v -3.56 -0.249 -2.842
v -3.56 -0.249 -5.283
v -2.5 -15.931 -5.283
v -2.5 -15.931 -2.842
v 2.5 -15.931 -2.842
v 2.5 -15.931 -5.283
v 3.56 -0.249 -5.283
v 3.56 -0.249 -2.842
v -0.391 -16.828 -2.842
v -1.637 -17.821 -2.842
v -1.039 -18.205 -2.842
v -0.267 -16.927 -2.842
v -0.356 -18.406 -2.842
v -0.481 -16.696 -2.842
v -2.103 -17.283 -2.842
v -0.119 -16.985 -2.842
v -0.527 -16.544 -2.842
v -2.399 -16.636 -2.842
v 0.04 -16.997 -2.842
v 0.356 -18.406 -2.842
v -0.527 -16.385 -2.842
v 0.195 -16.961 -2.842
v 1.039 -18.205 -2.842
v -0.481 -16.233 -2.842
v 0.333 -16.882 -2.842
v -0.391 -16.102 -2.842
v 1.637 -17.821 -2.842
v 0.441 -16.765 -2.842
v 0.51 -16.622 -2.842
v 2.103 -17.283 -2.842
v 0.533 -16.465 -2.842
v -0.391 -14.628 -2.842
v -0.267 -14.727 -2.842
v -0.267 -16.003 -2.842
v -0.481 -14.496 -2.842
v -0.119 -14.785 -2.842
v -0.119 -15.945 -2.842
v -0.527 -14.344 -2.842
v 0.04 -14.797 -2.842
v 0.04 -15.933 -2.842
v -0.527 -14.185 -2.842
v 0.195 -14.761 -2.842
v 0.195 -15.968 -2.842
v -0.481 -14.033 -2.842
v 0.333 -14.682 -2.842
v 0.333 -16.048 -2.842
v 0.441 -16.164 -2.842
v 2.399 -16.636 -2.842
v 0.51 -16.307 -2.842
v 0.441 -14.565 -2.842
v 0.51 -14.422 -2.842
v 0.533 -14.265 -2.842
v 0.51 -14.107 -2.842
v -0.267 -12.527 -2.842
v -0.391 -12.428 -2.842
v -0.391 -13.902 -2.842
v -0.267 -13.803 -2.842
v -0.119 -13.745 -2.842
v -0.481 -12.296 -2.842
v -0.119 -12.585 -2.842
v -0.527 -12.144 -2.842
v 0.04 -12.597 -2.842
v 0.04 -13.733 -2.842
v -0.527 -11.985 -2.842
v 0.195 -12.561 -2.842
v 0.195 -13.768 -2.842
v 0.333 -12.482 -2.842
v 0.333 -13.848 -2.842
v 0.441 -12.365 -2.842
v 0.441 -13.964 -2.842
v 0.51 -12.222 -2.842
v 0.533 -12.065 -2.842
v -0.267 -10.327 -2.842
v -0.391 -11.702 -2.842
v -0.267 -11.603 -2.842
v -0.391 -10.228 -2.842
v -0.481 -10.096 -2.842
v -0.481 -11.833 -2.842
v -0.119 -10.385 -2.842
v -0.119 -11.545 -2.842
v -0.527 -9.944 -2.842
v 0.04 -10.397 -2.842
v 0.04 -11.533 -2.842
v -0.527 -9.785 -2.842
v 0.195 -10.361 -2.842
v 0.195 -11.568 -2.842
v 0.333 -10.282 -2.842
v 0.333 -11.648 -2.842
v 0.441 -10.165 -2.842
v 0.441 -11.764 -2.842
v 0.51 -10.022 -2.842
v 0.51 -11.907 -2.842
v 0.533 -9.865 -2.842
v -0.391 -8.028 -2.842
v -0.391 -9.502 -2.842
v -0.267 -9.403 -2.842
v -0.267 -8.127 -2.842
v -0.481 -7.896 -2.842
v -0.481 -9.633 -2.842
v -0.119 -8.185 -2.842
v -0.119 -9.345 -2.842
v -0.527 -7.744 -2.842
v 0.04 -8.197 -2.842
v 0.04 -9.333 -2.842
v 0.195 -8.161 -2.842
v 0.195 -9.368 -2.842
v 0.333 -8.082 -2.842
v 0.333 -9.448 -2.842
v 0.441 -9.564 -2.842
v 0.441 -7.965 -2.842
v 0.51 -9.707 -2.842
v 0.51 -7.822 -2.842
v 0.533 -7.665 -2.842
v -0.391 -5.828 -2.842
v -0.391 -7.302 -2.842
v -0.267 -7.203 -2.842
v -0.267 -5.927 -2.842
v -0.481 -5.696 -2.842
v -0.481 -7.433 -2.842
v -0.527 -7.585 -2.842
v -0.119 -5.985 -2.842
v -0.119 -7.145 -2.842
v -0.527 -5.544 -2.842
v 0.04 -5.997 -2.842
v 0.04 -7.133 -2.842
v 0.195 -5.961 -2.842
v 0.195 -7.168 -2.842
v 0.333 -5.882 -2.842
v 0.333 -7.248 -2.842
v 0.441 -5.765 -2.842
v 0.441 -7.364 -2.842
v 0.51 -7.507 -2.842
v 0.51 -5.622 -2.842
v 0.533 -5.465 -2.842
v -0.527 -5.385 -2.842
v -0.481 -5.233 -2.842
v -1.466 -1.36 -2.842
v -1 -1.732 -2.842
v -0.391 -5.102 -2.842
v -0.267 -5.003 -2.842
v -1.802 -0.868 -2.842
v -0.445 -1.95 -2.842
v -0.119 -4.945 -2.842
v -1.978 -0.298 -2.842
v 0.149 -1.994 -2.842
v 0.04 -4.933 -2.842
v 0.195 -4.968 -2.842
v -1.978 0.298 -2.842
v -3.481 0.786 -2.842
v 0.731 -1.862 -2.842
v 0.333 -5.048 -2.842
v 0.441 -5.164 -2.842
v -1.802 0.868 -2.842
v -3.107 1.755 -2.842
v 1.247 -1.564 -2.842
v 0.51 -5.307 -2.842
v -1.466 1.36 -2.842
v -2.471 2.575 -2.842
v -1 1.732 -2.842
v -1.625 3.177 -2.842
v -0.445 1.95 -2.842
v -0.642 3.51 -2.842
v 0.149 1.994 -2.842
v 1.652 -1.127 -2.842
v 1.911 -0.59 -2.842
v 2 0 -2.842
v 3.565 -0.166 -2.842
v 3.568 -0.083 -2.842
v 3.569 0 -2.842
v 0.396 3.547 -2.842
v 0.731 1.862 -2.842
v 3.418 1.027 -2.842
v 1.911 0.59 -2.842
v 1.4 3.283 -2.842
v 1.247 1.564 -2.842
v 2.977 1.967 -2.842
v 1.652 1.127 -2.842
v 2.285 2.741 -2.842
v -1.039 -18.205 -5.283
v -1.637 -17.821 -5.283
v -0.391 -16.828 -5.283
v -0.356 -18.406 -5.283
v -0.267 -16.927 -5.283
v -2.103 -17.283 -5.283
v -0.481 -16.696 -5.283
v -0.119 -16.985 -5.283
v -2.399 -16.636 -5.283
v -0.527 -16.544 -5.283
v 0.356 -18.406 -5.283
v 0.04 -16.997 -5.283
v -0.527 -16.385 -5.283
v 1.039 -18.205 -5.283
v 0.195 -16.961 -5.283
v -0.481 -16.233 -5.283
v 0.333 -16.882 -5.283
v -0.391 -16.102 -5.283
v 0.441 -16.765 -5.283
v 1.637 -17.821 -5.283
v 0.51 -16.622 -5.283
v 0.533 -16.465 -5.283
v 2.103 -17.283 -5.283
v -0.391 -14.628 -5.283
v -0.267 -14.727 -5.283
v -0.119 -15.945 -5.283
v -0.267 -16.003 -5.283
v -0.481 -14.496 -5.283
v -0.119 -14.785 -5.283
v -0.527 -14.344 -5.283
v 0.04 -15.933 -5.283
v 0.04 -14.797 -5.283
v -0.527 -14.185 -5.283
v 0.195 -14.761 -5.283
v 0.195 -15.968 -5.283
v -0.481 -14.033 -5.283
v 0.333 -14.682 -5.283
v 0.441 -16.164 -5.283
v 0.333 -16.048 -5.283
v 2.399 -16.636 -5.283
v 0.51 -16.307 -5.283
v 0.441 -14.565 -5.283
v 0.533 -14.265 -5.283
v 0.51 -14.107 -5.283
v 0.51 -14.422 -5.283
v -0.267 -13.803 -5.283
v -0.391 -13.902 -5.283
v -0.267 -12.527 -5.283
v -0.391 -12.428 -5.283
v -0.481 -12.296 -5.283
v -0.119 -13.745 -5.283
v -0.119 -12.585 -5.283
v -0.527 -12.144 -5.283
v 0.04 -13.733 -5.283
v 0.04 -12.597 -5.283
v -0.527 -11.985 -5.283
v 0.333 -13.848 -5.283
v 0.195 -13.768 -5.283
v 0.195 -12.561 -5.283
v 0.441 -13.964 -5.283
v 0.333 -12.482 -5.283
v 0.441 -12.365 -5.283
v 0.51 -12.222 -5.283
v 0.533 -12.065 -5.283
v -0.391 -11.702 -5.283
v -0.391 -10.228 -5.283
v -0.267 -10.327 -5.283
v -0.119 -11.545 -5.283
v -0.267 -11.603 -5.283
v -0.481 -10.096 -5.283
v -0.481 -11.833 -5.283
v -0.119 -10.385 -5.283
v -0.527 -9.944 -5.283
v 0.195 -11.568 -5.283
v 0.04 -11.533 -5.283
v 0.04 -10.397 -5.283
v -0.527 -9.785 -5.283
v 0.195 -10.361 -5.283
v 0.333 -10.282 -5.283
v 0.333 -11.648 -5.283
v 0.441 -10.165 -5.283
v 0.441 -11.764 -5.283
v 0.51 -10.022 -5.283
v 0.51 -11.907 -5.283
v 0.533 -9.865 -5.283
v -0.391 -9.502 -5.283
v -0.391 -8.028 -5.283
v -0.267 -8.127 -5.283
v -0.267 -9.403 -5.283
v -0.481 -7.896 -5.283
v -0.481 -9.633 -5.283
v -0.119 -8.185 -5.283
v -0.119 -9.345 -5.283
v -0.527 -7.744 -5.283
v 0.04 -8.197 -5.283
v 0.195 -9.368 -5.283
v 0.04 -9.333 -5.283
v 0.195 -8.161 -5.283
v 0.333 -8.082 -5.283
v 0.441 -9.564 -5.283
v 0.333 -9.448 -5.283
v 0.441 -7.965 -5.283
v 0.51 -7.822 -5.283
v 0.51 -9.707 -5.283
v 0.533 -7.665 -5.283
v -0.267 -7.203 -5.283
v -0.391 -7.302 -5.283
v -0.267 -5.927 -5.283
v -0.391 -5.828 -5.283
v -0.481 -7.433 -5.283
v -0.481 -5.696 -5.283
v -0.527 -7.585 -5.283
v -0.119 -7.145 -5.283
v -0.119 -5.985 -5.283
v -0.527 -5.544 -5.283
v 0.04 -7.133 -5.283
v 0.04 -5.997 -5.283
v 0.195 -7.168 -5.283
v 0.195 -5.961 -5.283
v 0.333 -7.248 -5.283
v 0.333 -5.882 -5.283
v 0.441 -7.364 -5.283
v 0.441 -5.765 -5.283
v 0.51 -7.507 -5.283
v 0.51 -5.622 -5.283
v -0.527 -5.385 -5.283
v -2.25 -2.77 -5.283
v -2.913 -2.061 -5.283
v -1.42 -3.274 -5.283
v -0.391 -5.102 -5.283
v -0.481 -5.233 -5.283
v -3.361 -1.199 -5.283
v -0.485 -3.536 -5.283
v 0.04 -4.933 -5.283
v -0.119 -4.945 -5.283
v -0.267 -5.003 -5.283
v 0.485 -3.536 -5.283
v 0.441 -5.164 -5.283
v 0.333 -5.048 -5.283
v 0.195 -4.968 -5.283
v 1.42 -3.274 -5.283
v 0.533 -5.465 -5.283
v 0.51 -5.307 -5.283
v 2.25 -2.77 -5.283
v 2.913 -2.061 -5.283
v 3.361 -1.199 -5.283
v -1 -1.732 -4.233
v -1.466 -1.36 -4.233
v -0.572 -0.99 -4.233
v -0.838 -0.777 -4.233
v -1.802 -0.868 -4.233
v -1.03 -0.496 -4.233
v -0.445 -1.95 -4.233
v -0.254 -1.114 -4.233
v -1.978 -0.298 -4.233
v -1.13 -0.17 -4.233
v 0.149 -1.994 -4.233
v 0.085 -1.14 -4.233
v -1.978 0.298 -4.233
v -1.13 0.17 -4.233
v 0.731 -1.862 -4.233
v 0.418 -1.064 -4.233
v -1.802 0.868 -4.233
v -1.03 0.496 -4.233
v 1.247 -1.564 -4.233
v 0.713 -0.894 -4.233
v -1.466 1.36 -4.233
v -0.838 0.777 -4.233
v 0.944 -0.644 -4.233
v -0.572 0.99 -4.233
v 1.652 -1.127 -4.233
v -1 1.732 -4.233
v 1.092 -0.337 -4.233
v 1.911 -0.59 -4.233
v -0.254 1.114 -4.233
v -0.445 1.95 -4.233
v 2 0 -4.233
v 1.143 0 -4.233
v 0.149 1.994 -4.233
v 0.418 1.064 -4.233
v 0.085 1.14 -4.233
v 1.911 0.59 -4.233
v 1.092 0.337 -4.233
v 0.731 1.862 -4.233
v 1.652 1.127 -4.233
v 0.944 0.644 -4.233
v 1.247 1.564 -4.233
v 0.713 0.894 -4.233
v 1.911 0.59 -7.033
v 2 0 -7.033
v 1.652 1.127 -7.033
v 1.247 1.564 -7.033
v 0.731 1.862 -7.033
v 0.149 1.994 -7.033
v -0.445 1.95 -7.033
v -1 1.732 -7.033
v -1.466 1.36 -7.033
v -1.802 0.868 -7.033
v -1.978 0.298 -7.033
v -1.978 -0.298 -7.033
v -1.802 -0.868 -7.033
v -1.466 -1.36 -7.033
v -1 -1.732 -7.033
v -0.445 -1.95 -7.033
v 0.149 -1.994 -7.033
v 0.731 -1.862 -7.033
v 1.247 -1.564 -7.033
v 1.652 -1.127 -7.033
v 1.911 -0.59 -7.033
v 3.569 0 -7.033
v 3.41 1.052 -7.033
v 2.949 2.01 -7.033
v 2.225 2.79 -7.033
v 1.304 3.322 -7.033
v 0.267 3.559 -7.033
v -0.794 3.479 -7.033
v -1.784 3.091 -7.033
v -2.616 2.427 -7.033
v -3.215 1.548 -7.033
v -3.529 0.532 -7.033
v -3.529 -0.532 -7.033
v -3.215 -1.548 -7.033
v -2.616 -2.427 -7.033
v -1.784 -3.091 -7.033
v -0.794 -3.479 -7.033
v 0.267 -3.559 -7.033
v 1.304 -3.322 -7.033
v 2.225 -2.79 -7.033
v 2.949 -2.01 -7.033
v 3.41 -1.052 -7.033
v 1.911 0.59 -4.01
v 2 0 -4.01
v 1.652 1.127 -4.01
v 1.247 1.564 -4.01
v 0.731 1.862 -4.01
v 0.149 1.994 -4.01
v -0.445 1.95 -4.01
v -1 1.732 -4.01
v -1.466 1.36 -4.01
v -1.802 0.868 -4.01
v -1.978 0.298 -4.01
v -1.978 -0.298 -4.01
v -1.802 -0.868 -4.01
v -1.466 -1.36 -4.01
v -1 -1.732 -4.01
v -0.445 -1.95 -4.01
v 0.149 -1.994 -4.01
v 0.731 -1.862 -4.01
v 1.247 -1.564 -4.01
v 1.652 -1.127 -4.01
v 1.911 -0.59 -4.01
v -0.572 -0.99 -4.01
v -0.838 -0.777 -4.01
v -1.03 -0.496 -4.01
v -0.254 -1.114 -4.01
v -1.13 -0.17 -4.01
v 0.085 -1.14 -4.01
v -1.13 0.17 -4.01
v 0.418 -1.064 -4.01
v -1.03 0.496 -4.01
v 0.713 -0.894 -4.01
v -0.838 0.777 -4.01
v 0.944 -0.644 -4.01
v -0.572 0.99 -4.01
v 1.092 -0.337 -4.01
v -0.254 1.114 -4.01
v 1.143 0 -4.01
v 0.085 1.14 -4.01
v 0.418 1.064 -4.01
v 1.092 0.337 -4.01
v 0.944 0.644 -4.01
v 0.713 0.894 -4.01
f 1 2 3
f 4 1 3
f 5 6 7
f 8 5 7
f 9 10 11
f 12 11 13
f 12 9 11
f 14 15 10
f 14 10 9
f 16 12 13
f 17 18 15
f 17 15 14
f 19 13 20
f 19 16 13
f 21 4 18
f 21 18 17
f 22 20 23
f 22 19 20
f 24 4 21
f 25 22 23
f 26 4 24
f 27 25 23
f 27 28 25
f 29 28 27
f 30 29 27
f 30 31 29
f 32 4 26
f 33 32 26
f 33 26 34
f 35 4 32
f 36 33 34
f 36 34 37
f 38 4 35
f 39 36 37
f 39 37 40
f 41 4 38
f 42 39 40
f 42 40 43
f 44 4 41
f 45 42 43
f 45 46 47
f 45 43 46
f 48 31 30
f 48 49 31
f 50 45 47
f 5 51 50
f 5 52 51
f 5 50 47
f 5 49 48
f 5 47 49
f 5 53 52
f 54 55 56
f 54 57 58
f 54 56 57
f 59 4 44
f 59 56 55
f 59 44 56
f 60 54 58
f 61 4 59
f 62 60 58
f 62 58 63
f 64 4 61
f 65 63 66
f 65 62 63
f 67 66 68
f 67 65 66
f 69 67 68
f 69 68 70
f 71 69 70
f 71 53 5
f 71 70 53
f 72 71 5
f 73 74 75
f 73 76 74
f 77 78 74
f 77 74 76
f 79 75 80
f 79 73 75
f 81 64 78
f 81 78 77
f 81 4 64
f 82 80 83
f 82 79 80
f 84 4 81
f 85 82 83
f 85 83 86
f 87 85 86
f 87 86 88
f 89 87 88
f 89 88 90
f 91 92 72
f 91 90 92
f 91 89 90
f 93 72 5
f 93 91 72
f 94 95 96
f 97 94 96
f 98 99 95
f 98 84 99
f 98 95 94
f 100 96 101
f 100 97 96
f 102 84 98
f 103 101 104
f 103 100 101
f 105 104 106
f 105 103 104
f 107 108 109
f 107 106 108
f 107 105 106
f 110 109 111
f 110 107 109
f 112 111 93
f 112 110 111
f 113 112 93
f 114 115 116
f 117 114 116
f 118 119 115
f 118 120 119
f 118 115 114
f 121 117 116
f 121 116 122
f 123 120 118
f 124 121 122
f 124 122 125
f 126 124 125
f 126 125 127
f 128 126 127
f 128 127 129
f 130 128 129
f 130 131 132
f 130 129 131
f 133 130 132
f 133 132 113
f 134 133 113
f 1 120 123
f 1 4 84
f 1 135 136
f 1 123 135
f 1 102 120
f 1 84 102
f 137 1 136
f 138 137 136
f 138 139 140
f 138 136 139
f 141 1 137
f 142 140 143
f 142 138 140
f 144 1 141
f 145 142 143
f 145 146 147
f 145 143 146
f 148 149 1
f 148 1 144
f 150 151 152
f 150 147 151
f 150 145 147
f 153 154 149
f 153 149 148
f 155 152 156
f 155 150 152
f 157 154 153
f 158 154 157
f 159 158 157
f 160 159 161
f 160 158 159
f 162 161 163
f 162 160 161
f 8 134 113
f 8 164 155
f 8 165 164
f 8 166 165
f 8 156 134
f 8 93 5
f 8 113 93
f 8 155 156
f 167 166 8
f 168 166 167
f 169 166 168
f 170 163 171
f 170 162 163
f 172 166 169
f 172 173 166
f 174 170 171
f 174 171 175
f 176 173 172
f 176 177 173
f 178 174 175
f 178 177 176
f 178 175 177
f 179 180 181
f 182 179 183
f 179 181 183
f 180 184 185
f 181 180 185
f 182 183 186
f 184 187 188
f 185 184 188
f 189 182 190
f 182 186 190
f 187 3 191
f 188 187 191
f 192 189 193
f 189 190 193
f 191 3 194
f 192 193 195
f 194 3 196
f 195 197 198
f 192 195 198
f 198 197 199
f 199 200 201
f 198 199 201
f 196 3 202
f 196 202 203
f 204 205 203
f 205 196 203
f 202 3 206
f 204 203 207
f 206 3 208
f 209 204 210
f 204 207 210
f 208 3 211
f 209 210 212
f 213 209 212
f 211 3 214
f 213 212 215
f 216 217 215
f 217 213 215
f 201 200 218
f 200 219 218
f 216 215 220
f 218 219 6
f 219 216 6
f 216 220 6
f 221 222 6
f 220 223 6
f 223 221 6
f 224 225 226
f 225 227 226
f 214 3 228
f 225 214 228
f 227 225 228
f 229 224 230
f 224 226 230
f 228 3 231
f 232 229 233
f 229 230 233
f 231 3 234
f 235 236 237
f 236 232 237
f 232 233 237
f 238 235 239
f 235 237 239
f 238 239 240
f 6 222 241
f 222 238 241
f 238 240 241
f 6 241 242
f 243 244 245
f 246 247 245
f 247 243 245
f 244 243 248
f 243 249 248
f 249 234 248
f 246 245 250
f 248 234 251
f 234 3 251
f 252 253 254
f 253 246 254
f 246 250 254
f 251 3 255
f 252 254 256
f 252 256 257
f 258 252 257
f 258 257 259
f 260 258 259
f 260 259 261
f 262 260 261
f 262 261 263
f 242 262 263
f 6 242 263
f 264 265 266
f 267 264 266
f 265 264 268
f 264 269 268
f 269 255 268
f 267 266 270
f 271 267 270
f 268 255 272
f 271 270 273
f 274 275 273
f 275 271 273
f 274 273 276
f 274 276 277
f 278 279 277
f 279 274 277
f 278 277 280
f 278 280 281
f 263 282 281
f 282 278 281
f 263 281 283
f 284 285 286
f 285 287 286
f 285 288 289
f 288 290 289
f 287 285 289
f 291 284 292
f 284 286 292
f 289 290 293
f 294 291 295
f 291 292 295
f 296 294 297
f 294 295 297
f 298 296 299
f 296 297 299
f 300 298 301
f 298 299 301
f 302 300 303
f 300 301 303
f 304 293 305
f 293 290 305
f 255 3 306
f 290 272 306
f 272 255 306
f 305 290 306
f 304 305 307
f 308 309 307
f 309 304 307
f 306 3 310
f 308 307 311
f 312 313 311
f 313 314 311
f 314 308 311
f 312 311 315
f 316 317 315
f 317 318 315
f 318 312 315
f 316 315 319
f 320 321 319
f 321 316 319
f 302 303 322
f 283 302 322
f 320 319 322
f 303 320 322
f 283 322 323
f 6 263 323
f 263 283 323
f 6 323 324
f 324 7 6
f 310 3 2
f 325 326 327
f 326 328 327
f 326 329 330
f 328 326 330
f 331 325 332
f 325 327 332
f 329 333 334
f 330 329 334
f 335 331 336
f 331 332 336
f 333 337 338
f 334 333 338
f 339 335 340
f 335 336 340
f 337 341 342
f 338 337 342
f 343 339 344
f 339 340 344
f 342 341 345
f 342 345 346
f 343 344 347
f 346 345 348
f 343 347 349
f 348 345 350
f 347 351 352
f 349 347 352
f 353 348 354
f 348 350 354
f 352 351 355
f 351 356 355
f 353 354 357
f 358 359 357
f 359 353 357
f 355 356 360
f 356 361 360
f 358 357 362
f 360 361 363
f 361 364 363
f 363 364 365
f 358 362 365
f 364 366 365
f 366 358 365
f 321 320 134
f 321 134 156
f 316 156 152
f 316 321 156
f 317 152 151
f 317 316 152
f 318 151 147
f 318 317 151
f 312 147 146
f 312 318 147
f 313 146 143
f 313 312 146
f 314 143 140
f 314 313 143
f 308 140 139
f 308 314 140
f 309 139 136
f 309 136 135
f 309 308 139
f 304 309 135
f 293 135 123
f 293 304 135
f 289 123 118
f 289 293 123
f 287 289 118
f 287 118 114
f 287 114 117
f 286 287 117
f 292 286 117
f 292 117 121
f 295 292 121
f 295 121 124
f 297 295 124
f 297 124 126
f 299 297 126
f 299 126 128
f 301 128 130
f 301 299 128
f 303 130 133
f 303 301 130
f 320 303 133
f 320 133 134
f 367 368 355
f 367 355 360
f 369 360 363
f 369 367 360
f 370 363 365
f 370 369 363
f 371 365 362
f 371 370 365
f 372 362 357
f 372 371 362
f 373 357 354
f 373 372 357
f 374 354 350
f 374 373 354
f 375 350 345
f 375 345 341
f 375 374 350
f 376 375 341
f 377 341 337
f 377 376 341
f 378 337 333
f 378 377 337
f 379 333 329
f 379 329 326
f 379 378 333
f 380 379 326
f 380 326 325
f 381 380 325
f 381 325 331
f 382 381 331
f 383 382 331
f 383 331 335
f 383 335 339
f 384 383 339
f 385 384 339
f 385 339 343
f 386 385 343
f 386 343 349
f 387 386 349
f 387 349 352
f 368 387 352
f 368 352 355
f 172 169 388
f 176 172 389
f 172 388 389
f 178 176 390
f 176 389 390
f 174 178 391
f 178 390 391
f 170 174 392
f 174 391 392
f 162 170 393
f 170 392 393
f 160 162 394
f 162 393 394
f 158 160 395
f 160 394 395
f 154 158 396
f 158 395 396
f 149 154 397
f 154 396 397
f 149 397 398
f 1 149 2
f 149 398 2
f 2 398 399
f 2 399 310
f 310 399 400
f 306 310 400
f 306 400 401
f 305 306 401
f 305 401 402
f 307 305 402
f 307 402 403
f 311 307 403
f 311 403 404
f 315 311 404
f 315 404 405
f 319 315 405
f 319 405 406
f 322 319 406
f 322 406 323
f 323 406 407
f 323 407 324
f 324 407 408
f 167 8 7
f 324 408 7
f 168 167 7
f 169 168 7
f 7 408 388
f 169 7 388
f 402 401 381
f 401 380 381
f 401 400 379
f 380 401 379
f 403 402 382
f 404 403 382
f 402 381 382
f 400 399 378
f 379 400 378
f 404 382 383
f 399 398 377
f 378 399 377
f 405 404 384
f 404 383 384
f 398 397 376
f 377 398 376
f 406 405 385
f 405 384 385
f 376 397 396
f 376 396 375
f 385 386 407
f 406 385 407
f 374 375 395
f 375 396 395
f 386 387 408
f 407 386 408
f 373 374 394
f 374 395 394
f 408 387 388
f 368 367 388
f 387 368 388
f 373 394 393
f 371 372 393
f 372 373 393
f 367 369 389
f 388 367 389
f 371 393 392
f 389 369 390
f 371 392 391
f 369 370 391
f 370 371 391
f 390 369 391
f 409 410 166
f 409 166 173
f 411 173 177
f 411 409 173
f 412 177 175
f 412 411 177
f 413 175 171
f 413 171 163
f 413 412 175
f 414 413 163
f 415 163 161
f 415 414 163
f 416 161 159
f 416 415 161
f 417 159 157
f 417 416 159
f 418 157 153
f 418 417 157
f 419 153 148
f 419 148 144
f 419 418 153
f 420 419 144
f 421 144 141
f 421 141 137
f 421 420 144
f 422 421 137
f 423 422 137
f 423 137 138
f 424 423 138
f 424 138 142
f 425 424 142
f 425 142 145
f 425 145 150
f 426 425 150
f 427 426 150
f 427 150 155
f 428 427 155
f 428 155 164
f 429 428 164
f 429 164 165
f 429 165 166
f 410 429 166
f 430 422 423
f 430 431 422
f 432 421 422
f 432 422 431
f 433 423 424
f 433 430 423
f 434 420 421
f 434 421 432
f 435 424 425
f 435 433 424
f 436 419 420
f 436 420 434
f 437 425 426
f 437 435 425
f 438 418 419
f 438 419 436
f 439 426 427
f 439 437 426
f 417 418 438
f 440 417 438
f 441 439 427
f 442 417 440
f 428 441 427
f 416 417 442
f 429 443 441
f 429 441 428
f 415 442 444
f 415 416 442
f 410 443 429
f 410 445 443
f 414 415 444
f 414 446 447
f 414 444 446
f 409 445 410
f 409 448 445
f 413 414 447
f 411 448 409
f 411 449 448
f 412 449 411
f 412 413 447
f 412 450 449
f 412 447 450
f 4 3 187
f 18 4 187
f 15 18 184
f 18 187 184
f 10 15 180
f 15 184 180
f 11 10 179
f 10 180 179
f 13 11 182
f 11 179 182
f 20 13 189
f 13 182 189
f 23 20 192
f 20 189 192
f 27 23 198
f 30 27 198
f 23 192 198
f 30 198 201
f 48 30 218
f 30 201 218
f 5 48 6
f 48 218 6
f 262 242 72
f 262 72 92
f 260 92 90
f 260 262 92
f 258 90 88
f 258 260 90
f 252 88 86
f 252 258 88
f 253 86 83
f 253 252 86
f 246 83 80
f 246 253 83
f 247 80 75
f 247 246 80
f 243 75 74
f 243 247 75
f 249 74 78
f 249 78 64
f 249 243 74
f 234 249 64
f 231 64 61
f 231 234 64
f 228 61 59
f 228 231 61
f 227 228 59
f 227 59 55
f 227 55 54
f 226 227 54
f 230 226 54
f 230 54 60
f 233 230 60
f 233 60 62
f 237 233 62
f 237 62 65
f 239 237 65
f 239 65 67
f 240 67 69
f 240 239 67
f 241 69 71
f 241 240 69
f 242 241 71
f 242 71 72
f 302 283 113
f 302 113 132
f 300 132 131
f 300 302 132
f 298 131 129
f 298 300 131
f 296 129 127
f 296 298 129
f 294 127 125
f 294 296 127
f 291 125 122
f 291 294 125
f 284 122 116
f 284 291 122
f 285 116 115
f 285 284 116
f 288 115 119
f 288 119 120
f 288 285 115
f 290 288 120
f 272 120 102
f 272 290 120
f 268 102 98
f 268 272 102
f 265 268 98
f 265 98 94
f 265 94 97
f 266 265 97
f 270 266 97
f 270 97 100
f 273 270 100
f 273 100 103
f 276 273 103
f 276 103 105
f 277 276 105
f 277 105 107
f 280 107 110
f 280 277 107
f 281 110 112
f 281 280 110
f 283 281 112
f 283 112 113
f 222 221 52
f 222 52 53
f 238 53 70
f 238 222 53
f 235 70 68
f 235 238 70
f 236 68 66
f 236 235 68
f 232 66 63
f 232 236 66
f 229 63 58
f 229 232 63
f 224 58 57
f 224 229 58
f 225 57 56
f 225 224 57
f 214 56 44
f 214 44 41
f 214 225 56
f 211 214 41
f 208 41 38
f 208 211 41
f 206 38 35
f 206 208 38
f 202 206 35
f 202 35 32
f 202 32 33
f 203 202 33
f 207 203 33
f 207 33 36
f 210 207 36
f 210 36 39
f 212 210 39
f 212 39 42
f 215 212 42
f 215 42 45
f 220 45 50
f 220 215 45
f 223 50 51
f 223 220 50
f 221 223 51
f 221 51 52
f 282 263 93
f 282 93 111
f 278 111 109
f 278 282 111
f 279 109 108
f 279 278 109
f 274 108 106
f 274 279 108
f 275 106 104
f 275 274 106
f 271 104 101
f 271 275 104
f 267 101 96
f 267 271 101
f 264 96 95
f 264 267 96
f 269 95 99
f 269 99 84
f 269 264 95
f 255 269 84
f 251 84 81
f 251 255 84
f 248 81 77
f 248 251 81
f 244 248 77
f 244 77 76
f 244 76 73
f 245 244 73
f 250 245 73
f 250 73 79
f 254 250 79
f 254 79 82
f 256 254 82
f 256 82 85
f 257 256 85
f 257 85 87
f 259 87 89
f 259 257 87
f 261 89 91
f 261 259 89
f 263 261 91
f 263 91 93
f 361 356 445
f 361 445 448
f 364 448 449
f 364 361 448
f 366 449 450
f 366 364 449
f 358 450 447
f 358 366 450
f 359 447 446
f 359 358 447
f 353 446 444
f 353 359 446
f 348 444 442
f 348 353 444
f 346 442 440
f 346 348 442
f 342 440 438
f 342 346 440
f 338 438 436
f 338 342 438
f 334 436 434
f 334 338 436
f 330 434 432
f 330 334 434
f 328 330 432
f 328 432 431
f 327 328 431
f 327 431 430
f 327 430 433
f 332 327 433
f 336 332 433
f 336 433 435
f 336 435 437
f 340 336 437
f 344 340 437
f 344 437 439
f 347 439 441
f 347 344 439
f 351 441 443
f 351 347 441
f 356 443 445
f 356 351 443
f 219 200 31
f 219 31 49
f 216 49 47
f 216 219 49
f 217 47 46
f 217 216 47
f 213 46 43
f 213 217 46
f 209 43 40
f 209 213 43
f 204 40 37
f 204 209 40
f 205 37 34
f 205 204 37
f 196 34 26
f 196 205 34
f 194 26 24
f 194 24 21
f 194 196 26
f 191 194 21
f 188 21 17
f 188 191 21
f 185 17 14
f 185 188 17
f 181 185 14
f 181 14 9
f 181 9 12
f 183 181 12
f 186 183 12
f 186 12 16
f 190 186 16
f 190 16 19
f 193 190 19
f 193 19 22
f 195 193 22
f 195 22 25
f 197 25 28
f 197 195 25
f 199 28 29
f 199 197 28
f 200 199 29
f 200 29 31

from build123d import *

# Parameters (mm, degrees)
SKETCH1_R           = 3.5687
SKETCH1_R_2         = 2
BOSS_EXTRUDE1_DEPTH = 4.191
SKETCH5_R           = 2
SKETCH5_R_2         = 1.143
BOSS_EXTRUDE2_DEPTH = 0.2226
BOSS_EXTRUDE3_START = -2.441
SKETCH6_R           = 0.5334
BOSS_EXTRUDE3_DEPTH = 2.441


with BuildPart() as part:
    # Sketch1 → Boss-Extrude1 (new body)
    with BuildSketch(Plane.XY.offset(-7.032965862)):
        Circle(SKETCH1_R)
        Circle(SKETCH1_R_2, mode=Mode.SUBTRACT)
    extrude(amount=BOSS_EXTRUDE1_DEPTH)

    # Sketch5 → Boss-Extrude2 (add)
    with BuildSketch(Plane.XY.offset(-4.232965862)):
        Circle(SKETCH5_R)
        Circle(SKETCH5_R_2, mode=Mode.SUBTRACT)
    extrude(amount=BOSS_EXTRUDE2_DEPTH)

    # Sketch6 → Boss-Extrude3 (add)
    with BuildSketch(Plane.XY.offset(-2.841965862).offset(BOSS_EXTRUDE3_START)):
        with BuildLine():
            Line((2.5, -15.9313), (3.56, -0.249037527))
            ThreePointArc((3.56, -0.249037527), (0, -3.5687), (-3.56, -0.249037527))
            Line((-3.56, -0.249037527), (-2.5, -15.9313))
            ThreePointArc((-2.5, -15.9313), (0, -18.4313), (2.5, -15.9313))
        make_face()
        with Locations((0, -14.2647)):
            Circle(SKETCH6_R, mode=Mode.SUBTRACT)
        with Locations((0, -16.4647)):
            Circle(SKETCH6_R, mode=Mode.SUBTRACT)
        with Locations((0, -12.0647)):
            Circle(SKETCH6_R, mode=Mode.SUBTRACT)
        with Locations((0, -9.8647)):
            Circle(SKETCH6_R, mode=Mode.SUBTRACT)
        with Locations((0, -7.6647)):
            Circle(SKETCH6_R, mode=Mode.SUBTRACT)
        with Locations((0, -5.4647)):
            Circle(SKETCH6_R, mode=Mode.SUBTRACT)
    extrude(amount=BOSS_EXTRUDE3_DEPTH)


solid = part.part
